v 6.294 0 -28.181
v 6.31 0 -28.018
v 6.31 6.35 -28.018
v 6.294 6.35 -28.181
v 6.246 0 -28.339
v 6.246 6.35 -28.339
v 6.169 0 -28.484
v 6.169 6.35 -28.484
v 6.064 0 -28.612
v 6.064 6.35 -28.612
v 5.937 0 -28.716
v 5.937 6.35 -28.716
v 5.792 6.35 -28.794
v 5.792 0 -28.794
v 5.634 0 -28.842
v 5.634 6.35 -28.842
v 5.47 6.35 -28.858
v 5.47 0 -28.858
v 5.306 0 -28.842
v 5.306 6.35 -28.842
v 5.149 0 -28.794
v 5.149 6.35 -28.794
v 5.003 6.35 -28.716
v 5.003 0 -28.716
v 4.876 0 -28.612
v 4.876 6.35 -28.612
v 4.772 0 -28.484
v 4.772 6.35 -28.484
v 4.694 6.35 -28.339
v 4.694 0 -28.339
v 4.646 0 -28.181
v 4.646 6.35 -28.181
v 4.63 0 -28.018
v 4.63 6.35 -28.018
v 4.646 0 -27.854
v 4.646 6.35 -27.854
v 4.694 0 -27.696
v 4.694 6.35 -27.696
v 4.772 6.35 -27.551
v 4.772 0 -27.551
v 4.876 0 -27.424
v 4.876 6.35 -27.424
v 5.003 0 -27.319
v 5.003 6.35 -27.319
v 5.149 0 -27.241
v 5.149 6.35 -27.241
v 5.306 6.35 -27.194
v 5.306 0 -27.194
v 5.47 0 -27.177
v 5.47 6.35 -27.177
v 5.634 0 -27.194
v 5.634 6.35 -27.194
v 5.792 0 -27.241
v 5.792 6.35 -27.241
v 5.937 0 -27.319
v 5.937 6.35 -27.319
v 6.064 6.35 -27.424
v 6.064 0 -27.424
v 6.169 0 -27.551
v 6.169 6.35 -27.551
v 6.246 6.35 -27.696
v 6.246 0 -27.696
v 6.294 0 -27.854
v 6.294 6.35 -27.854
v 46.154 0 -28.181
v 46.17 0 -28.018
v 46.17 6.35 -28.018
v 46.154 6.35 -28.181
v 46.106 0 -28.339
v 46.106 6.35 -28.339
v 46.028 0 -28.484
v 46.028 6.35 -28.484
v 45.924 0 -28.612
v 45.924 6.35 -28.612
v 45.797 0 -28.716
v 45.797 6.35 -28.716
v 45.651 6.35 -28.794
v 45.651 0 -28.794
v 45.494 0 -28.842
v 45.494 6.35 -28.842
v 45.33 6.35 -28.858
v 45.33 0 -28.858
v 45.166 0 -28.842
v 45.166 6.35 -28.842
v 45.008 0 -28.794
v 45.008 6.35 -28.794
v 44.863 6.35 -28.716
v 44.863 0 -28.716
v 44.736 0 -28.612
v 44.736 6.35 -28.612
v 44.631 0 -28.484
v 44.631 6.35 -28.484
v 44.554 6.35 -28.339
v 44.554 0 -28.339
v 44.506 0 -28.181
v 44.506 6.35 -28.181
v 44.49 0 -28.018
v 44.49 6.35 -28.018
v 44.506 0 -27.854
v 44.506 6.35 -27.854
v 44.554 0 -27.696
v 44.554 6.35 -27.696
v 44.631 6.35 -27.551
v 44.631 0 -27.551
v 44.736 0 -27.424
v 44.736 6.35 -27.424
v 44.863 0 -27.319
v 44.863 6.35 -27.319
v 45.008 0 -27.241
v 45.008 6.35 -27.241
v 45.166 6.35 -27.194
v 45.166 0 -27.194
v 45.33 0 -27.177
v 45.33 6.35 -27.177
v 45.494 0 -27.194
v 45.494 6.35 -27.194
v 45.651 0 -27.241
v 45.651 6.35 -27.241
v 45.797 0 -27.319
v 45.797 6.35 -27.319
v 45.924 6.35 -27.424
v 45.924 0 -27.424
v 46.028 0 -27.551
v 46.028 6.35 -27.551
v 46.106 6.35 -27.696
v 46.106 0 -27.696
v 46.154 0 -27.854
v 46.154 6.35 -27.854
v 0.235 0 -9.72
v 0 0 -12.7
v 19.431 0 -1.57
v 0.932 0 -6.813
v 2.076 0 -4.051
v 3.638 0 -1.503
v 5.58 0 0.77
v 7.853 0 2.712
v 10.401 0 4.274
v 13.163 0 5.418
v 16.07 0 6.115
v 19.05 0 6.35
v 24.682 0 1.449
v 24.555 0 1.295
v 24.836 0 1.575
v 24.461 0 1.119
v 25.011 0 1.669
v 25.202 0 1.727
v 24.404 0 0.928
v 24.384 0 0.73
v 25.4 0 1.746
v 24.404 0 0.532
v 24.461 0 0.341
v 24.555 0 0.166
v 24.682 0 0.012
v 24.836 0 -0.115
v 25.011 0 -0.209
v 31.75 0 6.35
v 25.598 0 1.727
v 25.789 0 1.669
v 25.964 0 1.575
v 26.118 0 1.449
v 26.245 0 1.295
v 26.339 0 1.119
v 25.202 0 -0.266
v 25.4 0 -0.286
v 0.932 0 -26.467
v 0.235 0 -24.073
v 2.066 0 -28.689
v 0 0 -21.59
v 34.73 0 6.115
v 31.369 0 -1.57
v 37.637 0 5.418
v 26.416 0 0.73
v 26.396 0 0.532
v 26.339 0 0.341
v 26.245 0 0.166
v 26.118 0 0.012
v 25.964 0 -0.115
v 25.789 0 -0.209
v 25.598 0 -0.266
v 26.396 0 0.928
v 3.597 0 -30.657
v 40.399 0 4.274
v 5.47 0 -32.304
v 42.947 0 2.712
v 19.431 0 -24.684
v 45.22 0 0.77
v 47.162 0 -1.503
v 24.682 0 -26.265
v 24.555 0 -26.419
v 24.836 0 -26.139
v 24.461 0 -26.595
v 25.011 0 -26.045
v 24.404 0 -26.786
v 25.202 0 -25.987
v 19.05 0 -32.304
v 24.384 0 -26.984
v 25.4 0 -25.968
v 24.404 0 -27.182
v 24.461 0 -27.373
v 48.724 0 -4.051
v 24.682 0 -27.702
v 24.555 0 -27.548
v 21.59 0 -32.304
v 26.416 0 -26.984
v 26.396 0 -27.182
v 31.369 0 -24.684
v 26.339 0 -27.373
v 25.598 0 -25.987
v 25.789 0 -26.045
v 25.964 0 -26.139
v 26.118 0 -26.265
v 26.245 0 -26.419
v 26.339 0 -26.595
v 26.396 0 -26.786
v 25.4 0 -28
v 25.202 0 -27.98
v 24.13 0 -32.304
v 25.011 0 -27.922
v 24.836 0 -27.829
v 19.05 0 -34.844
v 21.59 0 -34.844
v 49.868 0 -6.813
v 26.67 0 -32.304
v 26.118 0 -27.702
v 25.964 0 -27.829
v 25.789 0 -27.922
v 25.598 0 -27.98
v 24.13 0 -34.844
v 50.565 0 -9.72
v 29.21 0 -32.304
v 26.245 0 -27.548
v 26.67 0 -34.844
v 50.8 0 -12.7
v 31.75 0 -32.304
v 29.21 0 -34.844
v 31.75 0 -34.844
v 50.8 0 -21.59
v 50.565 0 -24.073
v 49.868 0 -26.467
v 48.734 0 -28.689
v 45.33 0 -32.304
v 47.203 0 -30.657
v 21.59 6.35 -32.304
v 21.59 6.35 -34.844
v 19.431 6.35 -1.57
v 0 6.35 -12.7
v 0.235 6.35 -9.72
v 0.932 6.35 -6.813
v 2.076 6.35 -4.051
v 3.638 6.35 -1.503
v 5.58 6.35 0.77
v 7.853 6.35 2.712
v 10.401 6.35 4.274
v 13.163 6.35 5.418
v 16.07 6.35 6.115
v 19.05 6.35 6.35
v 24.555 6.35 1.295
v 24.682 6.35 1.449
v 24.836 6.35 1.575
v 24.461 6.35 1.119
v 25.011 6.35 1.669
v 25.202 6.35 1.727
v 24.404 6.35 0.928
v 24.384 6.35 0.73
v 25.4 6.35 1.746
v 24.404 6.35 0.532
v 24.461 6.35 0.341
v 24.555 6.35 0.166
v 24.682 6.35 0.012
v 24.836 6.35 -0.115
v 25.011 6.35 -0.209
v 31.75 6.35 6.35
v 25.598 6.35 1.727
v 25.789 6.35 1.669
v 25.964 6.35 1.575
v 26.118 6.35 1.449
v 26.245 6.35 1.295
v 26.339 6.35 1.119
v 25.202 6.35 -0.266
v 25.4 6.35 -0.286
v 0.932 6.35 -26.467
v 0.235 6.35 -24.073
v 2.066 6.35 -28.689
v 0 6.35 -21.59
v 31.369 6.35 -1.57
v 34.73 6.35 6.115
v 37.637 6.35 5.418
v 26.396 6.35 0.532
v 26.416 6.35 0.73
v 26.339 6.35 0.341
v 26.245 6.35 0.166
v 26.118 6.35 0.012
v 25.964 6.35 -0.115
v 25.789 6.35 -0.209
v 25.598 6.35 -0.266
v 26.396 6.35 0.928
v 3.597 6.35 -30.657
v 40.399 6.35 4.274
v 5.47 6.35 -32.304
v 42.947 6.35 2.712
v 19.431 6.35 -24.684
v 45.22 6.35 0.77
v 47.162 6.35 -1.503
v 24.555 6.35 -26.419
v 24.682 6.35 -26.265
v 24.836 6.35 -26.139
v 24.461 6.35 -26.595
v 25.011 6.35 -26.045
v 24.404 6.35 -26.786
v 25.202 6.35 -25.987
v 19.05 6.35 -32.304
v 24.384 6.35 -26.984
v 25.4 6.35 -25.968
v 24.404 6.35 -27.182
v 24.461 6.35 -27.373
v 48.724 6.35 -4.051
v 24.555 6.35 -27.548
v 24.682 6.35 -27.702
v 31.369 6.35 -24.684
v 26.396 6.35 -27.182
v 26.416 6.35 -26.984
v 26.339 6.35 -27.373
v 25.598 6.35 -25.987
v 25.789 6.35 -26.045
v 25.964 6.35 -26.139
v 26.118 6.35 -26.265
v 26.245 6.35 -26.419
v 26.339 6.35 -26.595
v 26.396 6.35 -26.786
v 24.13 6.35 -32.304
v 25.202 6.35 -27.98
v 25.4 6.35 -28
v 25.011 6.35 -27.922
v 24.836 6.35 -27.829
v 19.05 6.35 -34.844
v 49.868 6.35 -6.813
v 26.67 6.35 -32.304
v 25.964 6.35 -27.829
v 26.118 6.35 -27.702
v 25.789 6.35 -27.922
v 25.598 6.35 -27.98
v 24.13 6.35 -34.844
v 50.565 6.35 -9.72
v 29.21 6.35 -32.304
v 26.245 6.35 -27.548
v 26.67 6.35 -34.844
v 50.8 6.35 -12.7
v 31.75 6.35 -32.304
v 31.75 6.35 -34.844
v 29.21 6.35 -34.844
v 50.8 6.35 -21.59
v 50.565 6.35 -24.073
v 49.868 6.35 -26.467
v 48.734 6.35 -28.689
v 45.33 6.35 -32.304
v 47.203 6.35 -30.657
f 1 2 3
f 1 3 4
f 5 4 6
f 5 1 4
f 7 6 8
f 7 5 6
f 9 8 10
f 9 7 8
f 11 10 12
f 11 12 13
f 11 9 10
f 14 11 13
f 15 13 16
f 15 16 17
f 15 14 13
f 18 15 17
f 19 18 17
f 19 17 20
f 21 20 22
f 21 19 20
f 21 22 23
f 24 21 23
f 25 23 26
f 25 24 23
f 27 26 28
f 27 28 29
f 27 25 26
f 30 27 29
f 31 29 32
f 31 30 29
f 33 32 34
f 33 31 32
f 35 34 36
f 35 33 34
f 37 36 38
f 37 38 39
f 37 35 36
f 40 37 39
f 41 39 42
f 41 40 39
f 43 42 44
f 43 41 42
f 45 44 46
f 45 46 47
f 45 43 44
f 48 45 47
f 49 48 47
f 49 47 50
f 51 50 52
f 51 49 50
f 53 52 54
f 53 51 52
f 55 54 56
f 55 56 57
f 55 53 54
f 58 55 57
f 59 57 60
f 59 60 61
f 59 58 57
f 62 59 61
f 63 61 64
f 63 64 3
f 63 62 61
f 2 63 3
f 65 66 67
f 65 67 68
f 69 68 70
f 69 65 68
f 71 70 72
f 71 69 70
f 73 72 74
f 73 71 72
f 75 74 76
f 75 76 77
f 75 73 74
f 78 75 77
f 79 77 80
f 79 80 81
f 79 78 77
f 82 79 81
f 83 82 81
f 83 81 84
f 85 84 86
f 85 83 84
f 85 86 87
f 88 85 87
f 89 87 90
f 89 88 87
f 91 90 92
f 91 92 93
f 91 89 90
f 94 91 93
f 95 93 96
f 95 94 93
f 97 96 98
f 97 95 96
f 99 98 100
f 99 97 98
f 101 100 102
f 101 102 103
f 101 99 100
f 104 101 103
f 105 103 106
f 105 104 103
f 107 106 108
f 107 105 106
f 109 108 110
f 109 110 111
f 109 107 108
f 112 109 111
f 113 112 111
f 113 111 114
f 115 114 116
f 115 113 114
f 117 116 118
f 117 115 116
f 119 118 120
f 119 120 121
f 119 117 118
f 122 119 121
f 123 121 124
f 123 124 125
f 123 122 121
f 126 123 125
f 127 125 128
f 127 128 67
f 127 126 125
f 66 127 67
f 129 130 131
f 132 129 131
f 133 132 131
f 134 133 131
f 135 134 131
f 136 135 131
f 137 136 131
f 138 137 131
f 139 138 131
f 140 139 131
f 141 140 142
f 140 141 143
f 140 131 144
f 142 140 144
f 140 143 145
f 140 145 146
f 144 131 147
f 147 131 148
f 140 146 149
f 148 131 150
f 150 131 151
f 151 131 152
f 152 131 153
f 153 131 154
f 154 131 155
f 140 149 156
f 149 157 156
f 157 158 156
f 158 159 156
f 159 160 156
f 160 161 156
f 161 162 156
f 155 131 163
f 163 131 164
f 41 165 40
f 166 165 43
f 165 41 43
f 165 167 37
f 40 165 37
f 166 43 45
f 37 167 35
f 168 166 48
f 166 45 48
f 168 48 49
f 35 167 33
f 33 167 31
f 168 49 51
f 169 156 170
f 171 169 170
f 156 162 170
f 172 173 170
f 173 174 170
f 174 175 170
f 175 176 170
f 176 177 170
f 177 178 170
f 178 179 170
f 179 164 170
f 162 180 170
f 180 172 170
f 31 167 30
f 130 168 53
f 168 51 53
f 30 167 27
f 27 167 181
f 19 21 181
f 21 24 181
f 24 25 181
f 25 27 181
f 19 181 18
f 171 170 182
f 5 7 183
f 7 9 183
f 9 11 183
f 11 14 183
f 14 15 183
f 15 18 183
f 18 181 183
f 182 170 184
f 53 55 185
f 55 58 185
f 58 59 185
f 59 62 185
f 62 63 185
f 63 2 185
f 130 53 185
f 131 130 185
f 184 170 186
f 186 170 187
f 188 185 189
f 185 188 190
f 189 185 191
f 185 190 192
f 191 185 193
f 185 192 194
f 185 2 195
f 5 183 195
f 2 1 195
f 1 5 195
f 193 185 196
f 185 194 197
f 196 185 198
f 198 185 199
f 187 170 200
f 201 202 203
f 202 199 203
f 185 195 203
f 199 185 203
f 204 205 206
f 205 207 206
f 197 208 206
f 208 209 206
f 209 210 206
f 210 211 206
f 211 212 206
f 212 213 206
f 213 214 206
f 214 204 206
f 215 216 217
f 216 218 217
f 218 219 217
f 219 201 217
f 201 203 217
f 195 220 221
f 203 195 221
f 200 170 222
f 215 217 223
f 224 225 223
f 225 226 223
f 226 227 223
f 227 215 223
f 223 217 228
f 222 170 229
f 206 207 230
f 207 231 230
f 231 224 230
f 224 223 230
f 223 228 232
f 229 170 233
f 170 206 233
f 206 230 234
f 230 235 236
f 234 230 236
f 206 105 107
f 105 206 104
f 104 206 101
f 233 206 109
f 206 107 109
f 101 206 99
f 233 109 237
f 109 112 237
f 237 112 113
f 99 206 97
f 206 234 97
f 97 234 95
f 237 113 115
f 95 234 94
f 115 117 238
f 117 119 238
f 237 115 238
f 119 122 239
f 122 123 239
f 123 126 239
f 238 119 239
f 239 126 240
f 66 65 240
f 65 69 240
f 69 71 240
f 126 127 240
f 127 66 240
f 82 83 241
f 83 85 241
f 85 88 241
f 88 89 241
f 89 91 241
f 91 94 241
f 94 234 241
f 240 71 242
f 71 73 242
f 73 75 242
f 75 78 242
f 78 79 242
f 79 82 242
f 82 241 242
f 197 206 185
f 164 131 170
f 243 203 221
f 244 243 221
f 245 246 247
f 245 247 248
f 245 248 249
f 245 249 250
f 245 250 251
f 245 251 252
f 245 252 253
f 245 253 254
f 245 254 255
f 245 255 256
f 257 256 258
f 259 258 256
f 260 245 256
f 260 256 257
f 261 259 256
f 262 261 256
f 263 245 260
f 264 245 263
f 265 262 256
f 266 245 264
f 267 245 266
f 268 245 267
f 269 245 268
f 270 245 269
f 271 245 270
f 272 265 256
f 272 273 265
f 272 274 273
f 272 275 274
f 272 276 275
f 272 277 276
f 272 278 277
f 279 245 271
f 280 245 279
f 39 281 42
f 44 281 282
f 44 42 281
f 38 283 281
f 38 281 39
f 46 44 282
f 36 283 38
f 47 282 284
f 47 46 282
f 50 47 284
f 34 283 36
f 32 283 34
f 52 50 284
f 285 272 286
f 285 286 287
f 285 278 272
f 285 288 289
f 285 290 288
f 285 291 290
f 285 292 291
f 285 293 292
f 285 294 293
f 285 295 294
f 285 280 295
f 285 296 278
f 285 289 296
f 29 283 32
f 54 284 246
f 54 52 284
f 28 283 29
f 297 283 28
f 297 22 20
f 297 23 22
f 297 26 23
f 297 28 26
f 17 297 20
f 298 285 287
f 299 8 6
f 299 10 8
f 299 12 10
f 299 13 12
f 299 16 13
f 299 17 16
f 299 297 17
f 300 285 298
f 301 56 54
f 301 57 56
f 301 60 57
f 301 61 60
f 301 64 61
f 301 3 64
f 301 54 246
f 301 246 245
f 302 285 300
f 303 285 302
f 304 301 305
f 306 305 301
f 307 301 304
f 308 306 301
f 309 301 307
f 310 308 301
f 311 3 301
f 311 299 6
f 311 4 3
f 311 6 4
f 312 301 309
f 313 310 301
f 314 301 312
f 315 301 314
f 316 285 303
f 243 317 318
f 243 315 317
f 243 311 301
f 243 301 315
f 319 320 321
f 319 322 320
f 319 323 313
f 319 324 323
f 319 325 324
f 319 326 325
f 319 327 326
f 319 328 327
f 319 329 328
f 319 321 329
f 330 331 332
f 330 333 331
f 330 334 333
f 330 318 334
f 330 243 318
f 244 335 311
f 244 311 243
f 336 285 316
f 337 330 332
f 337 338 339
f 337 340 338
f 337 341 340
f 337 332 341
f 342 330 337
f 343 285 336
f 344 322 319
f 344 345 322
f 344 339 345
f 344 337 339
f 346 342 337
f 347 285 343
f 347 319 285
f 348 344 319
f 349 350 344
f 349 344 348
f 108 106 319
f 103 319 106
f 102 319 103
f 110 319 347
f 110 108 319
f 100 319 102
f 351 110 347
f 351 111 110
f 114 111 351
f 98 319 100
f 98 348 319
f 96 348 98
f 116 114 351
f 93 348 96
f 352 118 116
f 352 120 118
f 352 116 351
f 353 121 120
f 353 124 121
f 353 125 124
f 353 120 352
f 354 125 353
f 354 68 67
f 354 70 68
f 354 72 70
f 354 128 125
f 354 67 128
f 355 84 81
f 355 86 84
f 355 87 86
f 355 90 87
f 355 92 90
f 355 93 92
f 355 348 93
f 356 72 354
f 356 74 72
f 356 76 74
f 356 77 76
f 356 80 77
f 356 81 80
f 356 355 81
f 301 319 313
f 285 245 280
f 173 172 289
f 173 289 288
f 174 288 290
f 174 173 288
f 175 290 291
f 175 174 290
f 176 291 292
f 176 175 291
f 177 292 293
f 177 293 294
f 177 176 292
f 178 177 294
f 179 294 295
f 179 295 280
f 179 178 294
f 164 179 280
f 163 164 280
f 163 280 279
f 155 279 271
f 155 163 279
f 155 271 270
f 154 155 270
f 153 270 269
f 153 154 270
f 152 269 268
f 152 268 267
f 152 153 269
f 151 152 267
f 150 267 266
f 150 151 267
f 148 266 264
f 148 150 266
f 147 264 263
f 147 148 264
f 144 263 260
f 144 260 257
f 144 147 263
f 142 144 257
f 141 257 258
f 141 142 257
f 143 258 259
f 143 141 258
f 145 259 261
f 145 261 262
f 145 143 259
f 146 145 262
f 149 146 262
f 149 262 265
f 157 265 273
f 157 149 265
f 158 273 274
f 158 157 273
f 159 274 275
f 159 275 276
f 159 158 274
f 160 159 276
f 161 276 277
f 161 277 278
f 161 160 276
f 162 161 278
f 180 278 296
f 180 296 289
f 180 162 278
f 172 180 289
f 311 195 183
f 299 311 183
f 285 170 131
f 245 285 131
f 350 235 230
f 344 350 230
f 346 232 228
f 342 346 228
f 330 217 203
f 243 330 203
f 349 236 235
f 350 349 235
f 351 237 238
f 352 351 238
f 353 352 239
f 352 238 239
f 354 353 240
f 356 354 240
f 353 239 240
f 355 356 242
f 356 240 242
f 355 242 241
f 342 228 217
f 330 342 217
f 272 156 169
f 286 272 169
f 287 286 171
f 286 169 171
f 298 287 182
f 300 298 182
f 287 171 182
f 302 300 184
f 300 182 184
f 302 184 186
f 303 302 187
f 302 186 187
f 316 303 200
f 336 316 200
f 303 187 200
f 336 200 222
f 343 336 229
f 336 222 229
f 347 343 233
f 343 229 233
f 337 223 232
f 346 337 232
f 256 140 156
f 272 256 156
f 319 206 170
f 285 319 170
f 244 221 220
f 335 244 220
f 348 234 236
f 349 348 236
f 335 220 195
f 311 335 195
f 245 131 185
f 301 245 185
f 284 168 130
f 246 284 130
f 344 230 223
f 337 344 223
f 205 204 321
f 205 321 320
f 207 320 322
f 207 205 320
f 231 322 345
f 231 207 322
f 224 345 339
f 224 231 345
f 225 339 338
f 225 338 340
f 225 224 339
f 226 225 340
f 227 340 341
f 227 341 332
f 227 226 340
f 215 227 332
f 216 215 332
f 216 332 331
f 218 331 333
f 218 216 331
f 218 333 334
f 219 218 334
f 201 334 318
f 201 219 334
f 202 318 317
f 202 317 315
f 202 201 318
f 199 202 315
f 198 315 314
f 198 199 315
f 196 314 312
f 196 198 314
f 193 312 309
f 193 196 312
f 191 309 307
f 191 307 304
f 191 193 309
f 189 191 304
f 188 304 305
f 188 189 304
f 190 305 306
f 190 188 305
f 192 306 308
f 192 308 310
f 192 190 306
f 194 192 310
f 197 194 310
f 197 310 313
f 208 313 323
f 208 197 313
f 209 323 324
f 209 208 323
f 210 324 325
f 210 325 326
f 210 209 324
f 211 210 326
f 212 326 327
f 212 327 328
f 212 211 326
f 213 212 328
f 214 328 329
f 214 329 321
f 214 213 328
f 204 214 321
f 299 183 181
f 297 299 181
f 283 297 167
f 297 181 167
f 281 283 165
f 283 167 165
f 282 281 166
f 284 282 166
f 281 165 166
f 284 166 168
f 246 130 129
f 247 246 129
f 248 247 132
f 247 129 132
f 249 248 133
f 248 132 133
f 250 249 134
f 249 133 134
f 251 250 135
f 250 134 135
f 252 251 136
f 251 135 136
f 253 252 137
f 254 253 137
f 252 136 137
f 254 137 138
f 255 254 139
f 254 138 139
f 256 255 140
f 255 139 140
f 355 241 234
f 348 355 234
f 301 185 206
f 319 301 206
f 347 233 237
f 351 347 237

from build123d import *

# Parameters (mm, degrees)
SKETCH2_R           = 0.840105
SKETCH2_R_2         = 1.016
BOSS_EXTRUDE2_DEPTH = 6.35


with BuildPart() as part:
    # Sketch2 → Boss-Extrude2 (new body)
    with BuildSketch(Plane(origin=(0, 0, 0), x_dir=(1, 0, 0), z_dir=(0, 1, 0))):
        with BuildLine():
            Line((19.05, -6.35), (31.75, -6.35))
            ThreePointArc((31.75, -6.35), (45.220384182, -0.770384182), (50.8, 12.7))
            Line((50.8, 12.7), (50.8, 21.59))
            ThreePointArc((50.8, 21.59), (49.353345536, 27.604748069), (45.329825459, 32.303821346))
            Line((45.329825459, 32.303821346), (31.75, 32.303821346))
            Line((31.75, 32.303821346), (31.75, 34.843821346))
            Line((31.75, 34.843821346), (29.21, 34.843821346))
            Line((29.21, 34.843821346), (29.21, 32.303821346))
            Line((29.21, 32.303821346), (26.67, 32.303821346))
            Line((26.67, 32.303821346), (26.67, 34.843821346))
            Line((26.67, 34.843821346), (24.13, 34.843821346))
            Line((24.13, 34.843821346), (24.13, 32.303821346))
            Line((24.13, 32.303821346), (21.59, 32.303821346))
            Line((21.59, 32.303821346), (21.59, 34.843821346))
            Line((21.59, 34.843821346), (19.05, 34.843821346))
            Line((19.05, 34.843821346), (19.05, 32.303821346))
            Line((19.05, 32.303821346), (5.470174541, 32.303821346))
            ThreePointArc((5.470174541, 32.303821346), (1.446654464, 27.604748069), (0, 21.59))
            Line((0, 21.59), (0, 12.7))
            ThreePointArc((0, 12.7), (5.579615818, -0.770384182), (19.05, -6.35))
        make_face()
        with Locations((45.329825459, 28.017571346)):
            Circle(SKETCH2_R, mode=Mode.SUBTRACT)
        with Locations((25.4, 26.983791346)):
            Circle(SKETCH2_R_2, mode=Mode.SUBTRACT)
        with Locations((5.47017448, 28.017571346)):
            Circle(SKETCH2_R, mode=Mode.SUBTRACT)
        with Locations((25.4, -0.730148654)):
            Circle(SKETCH2_R_2, mode=Mode.SUBTRACT)
        Polygon((25.4, 24.683821346), (31.369, 24.683821346), (31.369, 1.569821346), (19.431, 1.569821346), (19.431, 24.683821346), align=None, mode=Mode.SUBTRACT)
    extrude(amount=BOSS_EXTRUDE2_DEPTH)


solid = part.part
